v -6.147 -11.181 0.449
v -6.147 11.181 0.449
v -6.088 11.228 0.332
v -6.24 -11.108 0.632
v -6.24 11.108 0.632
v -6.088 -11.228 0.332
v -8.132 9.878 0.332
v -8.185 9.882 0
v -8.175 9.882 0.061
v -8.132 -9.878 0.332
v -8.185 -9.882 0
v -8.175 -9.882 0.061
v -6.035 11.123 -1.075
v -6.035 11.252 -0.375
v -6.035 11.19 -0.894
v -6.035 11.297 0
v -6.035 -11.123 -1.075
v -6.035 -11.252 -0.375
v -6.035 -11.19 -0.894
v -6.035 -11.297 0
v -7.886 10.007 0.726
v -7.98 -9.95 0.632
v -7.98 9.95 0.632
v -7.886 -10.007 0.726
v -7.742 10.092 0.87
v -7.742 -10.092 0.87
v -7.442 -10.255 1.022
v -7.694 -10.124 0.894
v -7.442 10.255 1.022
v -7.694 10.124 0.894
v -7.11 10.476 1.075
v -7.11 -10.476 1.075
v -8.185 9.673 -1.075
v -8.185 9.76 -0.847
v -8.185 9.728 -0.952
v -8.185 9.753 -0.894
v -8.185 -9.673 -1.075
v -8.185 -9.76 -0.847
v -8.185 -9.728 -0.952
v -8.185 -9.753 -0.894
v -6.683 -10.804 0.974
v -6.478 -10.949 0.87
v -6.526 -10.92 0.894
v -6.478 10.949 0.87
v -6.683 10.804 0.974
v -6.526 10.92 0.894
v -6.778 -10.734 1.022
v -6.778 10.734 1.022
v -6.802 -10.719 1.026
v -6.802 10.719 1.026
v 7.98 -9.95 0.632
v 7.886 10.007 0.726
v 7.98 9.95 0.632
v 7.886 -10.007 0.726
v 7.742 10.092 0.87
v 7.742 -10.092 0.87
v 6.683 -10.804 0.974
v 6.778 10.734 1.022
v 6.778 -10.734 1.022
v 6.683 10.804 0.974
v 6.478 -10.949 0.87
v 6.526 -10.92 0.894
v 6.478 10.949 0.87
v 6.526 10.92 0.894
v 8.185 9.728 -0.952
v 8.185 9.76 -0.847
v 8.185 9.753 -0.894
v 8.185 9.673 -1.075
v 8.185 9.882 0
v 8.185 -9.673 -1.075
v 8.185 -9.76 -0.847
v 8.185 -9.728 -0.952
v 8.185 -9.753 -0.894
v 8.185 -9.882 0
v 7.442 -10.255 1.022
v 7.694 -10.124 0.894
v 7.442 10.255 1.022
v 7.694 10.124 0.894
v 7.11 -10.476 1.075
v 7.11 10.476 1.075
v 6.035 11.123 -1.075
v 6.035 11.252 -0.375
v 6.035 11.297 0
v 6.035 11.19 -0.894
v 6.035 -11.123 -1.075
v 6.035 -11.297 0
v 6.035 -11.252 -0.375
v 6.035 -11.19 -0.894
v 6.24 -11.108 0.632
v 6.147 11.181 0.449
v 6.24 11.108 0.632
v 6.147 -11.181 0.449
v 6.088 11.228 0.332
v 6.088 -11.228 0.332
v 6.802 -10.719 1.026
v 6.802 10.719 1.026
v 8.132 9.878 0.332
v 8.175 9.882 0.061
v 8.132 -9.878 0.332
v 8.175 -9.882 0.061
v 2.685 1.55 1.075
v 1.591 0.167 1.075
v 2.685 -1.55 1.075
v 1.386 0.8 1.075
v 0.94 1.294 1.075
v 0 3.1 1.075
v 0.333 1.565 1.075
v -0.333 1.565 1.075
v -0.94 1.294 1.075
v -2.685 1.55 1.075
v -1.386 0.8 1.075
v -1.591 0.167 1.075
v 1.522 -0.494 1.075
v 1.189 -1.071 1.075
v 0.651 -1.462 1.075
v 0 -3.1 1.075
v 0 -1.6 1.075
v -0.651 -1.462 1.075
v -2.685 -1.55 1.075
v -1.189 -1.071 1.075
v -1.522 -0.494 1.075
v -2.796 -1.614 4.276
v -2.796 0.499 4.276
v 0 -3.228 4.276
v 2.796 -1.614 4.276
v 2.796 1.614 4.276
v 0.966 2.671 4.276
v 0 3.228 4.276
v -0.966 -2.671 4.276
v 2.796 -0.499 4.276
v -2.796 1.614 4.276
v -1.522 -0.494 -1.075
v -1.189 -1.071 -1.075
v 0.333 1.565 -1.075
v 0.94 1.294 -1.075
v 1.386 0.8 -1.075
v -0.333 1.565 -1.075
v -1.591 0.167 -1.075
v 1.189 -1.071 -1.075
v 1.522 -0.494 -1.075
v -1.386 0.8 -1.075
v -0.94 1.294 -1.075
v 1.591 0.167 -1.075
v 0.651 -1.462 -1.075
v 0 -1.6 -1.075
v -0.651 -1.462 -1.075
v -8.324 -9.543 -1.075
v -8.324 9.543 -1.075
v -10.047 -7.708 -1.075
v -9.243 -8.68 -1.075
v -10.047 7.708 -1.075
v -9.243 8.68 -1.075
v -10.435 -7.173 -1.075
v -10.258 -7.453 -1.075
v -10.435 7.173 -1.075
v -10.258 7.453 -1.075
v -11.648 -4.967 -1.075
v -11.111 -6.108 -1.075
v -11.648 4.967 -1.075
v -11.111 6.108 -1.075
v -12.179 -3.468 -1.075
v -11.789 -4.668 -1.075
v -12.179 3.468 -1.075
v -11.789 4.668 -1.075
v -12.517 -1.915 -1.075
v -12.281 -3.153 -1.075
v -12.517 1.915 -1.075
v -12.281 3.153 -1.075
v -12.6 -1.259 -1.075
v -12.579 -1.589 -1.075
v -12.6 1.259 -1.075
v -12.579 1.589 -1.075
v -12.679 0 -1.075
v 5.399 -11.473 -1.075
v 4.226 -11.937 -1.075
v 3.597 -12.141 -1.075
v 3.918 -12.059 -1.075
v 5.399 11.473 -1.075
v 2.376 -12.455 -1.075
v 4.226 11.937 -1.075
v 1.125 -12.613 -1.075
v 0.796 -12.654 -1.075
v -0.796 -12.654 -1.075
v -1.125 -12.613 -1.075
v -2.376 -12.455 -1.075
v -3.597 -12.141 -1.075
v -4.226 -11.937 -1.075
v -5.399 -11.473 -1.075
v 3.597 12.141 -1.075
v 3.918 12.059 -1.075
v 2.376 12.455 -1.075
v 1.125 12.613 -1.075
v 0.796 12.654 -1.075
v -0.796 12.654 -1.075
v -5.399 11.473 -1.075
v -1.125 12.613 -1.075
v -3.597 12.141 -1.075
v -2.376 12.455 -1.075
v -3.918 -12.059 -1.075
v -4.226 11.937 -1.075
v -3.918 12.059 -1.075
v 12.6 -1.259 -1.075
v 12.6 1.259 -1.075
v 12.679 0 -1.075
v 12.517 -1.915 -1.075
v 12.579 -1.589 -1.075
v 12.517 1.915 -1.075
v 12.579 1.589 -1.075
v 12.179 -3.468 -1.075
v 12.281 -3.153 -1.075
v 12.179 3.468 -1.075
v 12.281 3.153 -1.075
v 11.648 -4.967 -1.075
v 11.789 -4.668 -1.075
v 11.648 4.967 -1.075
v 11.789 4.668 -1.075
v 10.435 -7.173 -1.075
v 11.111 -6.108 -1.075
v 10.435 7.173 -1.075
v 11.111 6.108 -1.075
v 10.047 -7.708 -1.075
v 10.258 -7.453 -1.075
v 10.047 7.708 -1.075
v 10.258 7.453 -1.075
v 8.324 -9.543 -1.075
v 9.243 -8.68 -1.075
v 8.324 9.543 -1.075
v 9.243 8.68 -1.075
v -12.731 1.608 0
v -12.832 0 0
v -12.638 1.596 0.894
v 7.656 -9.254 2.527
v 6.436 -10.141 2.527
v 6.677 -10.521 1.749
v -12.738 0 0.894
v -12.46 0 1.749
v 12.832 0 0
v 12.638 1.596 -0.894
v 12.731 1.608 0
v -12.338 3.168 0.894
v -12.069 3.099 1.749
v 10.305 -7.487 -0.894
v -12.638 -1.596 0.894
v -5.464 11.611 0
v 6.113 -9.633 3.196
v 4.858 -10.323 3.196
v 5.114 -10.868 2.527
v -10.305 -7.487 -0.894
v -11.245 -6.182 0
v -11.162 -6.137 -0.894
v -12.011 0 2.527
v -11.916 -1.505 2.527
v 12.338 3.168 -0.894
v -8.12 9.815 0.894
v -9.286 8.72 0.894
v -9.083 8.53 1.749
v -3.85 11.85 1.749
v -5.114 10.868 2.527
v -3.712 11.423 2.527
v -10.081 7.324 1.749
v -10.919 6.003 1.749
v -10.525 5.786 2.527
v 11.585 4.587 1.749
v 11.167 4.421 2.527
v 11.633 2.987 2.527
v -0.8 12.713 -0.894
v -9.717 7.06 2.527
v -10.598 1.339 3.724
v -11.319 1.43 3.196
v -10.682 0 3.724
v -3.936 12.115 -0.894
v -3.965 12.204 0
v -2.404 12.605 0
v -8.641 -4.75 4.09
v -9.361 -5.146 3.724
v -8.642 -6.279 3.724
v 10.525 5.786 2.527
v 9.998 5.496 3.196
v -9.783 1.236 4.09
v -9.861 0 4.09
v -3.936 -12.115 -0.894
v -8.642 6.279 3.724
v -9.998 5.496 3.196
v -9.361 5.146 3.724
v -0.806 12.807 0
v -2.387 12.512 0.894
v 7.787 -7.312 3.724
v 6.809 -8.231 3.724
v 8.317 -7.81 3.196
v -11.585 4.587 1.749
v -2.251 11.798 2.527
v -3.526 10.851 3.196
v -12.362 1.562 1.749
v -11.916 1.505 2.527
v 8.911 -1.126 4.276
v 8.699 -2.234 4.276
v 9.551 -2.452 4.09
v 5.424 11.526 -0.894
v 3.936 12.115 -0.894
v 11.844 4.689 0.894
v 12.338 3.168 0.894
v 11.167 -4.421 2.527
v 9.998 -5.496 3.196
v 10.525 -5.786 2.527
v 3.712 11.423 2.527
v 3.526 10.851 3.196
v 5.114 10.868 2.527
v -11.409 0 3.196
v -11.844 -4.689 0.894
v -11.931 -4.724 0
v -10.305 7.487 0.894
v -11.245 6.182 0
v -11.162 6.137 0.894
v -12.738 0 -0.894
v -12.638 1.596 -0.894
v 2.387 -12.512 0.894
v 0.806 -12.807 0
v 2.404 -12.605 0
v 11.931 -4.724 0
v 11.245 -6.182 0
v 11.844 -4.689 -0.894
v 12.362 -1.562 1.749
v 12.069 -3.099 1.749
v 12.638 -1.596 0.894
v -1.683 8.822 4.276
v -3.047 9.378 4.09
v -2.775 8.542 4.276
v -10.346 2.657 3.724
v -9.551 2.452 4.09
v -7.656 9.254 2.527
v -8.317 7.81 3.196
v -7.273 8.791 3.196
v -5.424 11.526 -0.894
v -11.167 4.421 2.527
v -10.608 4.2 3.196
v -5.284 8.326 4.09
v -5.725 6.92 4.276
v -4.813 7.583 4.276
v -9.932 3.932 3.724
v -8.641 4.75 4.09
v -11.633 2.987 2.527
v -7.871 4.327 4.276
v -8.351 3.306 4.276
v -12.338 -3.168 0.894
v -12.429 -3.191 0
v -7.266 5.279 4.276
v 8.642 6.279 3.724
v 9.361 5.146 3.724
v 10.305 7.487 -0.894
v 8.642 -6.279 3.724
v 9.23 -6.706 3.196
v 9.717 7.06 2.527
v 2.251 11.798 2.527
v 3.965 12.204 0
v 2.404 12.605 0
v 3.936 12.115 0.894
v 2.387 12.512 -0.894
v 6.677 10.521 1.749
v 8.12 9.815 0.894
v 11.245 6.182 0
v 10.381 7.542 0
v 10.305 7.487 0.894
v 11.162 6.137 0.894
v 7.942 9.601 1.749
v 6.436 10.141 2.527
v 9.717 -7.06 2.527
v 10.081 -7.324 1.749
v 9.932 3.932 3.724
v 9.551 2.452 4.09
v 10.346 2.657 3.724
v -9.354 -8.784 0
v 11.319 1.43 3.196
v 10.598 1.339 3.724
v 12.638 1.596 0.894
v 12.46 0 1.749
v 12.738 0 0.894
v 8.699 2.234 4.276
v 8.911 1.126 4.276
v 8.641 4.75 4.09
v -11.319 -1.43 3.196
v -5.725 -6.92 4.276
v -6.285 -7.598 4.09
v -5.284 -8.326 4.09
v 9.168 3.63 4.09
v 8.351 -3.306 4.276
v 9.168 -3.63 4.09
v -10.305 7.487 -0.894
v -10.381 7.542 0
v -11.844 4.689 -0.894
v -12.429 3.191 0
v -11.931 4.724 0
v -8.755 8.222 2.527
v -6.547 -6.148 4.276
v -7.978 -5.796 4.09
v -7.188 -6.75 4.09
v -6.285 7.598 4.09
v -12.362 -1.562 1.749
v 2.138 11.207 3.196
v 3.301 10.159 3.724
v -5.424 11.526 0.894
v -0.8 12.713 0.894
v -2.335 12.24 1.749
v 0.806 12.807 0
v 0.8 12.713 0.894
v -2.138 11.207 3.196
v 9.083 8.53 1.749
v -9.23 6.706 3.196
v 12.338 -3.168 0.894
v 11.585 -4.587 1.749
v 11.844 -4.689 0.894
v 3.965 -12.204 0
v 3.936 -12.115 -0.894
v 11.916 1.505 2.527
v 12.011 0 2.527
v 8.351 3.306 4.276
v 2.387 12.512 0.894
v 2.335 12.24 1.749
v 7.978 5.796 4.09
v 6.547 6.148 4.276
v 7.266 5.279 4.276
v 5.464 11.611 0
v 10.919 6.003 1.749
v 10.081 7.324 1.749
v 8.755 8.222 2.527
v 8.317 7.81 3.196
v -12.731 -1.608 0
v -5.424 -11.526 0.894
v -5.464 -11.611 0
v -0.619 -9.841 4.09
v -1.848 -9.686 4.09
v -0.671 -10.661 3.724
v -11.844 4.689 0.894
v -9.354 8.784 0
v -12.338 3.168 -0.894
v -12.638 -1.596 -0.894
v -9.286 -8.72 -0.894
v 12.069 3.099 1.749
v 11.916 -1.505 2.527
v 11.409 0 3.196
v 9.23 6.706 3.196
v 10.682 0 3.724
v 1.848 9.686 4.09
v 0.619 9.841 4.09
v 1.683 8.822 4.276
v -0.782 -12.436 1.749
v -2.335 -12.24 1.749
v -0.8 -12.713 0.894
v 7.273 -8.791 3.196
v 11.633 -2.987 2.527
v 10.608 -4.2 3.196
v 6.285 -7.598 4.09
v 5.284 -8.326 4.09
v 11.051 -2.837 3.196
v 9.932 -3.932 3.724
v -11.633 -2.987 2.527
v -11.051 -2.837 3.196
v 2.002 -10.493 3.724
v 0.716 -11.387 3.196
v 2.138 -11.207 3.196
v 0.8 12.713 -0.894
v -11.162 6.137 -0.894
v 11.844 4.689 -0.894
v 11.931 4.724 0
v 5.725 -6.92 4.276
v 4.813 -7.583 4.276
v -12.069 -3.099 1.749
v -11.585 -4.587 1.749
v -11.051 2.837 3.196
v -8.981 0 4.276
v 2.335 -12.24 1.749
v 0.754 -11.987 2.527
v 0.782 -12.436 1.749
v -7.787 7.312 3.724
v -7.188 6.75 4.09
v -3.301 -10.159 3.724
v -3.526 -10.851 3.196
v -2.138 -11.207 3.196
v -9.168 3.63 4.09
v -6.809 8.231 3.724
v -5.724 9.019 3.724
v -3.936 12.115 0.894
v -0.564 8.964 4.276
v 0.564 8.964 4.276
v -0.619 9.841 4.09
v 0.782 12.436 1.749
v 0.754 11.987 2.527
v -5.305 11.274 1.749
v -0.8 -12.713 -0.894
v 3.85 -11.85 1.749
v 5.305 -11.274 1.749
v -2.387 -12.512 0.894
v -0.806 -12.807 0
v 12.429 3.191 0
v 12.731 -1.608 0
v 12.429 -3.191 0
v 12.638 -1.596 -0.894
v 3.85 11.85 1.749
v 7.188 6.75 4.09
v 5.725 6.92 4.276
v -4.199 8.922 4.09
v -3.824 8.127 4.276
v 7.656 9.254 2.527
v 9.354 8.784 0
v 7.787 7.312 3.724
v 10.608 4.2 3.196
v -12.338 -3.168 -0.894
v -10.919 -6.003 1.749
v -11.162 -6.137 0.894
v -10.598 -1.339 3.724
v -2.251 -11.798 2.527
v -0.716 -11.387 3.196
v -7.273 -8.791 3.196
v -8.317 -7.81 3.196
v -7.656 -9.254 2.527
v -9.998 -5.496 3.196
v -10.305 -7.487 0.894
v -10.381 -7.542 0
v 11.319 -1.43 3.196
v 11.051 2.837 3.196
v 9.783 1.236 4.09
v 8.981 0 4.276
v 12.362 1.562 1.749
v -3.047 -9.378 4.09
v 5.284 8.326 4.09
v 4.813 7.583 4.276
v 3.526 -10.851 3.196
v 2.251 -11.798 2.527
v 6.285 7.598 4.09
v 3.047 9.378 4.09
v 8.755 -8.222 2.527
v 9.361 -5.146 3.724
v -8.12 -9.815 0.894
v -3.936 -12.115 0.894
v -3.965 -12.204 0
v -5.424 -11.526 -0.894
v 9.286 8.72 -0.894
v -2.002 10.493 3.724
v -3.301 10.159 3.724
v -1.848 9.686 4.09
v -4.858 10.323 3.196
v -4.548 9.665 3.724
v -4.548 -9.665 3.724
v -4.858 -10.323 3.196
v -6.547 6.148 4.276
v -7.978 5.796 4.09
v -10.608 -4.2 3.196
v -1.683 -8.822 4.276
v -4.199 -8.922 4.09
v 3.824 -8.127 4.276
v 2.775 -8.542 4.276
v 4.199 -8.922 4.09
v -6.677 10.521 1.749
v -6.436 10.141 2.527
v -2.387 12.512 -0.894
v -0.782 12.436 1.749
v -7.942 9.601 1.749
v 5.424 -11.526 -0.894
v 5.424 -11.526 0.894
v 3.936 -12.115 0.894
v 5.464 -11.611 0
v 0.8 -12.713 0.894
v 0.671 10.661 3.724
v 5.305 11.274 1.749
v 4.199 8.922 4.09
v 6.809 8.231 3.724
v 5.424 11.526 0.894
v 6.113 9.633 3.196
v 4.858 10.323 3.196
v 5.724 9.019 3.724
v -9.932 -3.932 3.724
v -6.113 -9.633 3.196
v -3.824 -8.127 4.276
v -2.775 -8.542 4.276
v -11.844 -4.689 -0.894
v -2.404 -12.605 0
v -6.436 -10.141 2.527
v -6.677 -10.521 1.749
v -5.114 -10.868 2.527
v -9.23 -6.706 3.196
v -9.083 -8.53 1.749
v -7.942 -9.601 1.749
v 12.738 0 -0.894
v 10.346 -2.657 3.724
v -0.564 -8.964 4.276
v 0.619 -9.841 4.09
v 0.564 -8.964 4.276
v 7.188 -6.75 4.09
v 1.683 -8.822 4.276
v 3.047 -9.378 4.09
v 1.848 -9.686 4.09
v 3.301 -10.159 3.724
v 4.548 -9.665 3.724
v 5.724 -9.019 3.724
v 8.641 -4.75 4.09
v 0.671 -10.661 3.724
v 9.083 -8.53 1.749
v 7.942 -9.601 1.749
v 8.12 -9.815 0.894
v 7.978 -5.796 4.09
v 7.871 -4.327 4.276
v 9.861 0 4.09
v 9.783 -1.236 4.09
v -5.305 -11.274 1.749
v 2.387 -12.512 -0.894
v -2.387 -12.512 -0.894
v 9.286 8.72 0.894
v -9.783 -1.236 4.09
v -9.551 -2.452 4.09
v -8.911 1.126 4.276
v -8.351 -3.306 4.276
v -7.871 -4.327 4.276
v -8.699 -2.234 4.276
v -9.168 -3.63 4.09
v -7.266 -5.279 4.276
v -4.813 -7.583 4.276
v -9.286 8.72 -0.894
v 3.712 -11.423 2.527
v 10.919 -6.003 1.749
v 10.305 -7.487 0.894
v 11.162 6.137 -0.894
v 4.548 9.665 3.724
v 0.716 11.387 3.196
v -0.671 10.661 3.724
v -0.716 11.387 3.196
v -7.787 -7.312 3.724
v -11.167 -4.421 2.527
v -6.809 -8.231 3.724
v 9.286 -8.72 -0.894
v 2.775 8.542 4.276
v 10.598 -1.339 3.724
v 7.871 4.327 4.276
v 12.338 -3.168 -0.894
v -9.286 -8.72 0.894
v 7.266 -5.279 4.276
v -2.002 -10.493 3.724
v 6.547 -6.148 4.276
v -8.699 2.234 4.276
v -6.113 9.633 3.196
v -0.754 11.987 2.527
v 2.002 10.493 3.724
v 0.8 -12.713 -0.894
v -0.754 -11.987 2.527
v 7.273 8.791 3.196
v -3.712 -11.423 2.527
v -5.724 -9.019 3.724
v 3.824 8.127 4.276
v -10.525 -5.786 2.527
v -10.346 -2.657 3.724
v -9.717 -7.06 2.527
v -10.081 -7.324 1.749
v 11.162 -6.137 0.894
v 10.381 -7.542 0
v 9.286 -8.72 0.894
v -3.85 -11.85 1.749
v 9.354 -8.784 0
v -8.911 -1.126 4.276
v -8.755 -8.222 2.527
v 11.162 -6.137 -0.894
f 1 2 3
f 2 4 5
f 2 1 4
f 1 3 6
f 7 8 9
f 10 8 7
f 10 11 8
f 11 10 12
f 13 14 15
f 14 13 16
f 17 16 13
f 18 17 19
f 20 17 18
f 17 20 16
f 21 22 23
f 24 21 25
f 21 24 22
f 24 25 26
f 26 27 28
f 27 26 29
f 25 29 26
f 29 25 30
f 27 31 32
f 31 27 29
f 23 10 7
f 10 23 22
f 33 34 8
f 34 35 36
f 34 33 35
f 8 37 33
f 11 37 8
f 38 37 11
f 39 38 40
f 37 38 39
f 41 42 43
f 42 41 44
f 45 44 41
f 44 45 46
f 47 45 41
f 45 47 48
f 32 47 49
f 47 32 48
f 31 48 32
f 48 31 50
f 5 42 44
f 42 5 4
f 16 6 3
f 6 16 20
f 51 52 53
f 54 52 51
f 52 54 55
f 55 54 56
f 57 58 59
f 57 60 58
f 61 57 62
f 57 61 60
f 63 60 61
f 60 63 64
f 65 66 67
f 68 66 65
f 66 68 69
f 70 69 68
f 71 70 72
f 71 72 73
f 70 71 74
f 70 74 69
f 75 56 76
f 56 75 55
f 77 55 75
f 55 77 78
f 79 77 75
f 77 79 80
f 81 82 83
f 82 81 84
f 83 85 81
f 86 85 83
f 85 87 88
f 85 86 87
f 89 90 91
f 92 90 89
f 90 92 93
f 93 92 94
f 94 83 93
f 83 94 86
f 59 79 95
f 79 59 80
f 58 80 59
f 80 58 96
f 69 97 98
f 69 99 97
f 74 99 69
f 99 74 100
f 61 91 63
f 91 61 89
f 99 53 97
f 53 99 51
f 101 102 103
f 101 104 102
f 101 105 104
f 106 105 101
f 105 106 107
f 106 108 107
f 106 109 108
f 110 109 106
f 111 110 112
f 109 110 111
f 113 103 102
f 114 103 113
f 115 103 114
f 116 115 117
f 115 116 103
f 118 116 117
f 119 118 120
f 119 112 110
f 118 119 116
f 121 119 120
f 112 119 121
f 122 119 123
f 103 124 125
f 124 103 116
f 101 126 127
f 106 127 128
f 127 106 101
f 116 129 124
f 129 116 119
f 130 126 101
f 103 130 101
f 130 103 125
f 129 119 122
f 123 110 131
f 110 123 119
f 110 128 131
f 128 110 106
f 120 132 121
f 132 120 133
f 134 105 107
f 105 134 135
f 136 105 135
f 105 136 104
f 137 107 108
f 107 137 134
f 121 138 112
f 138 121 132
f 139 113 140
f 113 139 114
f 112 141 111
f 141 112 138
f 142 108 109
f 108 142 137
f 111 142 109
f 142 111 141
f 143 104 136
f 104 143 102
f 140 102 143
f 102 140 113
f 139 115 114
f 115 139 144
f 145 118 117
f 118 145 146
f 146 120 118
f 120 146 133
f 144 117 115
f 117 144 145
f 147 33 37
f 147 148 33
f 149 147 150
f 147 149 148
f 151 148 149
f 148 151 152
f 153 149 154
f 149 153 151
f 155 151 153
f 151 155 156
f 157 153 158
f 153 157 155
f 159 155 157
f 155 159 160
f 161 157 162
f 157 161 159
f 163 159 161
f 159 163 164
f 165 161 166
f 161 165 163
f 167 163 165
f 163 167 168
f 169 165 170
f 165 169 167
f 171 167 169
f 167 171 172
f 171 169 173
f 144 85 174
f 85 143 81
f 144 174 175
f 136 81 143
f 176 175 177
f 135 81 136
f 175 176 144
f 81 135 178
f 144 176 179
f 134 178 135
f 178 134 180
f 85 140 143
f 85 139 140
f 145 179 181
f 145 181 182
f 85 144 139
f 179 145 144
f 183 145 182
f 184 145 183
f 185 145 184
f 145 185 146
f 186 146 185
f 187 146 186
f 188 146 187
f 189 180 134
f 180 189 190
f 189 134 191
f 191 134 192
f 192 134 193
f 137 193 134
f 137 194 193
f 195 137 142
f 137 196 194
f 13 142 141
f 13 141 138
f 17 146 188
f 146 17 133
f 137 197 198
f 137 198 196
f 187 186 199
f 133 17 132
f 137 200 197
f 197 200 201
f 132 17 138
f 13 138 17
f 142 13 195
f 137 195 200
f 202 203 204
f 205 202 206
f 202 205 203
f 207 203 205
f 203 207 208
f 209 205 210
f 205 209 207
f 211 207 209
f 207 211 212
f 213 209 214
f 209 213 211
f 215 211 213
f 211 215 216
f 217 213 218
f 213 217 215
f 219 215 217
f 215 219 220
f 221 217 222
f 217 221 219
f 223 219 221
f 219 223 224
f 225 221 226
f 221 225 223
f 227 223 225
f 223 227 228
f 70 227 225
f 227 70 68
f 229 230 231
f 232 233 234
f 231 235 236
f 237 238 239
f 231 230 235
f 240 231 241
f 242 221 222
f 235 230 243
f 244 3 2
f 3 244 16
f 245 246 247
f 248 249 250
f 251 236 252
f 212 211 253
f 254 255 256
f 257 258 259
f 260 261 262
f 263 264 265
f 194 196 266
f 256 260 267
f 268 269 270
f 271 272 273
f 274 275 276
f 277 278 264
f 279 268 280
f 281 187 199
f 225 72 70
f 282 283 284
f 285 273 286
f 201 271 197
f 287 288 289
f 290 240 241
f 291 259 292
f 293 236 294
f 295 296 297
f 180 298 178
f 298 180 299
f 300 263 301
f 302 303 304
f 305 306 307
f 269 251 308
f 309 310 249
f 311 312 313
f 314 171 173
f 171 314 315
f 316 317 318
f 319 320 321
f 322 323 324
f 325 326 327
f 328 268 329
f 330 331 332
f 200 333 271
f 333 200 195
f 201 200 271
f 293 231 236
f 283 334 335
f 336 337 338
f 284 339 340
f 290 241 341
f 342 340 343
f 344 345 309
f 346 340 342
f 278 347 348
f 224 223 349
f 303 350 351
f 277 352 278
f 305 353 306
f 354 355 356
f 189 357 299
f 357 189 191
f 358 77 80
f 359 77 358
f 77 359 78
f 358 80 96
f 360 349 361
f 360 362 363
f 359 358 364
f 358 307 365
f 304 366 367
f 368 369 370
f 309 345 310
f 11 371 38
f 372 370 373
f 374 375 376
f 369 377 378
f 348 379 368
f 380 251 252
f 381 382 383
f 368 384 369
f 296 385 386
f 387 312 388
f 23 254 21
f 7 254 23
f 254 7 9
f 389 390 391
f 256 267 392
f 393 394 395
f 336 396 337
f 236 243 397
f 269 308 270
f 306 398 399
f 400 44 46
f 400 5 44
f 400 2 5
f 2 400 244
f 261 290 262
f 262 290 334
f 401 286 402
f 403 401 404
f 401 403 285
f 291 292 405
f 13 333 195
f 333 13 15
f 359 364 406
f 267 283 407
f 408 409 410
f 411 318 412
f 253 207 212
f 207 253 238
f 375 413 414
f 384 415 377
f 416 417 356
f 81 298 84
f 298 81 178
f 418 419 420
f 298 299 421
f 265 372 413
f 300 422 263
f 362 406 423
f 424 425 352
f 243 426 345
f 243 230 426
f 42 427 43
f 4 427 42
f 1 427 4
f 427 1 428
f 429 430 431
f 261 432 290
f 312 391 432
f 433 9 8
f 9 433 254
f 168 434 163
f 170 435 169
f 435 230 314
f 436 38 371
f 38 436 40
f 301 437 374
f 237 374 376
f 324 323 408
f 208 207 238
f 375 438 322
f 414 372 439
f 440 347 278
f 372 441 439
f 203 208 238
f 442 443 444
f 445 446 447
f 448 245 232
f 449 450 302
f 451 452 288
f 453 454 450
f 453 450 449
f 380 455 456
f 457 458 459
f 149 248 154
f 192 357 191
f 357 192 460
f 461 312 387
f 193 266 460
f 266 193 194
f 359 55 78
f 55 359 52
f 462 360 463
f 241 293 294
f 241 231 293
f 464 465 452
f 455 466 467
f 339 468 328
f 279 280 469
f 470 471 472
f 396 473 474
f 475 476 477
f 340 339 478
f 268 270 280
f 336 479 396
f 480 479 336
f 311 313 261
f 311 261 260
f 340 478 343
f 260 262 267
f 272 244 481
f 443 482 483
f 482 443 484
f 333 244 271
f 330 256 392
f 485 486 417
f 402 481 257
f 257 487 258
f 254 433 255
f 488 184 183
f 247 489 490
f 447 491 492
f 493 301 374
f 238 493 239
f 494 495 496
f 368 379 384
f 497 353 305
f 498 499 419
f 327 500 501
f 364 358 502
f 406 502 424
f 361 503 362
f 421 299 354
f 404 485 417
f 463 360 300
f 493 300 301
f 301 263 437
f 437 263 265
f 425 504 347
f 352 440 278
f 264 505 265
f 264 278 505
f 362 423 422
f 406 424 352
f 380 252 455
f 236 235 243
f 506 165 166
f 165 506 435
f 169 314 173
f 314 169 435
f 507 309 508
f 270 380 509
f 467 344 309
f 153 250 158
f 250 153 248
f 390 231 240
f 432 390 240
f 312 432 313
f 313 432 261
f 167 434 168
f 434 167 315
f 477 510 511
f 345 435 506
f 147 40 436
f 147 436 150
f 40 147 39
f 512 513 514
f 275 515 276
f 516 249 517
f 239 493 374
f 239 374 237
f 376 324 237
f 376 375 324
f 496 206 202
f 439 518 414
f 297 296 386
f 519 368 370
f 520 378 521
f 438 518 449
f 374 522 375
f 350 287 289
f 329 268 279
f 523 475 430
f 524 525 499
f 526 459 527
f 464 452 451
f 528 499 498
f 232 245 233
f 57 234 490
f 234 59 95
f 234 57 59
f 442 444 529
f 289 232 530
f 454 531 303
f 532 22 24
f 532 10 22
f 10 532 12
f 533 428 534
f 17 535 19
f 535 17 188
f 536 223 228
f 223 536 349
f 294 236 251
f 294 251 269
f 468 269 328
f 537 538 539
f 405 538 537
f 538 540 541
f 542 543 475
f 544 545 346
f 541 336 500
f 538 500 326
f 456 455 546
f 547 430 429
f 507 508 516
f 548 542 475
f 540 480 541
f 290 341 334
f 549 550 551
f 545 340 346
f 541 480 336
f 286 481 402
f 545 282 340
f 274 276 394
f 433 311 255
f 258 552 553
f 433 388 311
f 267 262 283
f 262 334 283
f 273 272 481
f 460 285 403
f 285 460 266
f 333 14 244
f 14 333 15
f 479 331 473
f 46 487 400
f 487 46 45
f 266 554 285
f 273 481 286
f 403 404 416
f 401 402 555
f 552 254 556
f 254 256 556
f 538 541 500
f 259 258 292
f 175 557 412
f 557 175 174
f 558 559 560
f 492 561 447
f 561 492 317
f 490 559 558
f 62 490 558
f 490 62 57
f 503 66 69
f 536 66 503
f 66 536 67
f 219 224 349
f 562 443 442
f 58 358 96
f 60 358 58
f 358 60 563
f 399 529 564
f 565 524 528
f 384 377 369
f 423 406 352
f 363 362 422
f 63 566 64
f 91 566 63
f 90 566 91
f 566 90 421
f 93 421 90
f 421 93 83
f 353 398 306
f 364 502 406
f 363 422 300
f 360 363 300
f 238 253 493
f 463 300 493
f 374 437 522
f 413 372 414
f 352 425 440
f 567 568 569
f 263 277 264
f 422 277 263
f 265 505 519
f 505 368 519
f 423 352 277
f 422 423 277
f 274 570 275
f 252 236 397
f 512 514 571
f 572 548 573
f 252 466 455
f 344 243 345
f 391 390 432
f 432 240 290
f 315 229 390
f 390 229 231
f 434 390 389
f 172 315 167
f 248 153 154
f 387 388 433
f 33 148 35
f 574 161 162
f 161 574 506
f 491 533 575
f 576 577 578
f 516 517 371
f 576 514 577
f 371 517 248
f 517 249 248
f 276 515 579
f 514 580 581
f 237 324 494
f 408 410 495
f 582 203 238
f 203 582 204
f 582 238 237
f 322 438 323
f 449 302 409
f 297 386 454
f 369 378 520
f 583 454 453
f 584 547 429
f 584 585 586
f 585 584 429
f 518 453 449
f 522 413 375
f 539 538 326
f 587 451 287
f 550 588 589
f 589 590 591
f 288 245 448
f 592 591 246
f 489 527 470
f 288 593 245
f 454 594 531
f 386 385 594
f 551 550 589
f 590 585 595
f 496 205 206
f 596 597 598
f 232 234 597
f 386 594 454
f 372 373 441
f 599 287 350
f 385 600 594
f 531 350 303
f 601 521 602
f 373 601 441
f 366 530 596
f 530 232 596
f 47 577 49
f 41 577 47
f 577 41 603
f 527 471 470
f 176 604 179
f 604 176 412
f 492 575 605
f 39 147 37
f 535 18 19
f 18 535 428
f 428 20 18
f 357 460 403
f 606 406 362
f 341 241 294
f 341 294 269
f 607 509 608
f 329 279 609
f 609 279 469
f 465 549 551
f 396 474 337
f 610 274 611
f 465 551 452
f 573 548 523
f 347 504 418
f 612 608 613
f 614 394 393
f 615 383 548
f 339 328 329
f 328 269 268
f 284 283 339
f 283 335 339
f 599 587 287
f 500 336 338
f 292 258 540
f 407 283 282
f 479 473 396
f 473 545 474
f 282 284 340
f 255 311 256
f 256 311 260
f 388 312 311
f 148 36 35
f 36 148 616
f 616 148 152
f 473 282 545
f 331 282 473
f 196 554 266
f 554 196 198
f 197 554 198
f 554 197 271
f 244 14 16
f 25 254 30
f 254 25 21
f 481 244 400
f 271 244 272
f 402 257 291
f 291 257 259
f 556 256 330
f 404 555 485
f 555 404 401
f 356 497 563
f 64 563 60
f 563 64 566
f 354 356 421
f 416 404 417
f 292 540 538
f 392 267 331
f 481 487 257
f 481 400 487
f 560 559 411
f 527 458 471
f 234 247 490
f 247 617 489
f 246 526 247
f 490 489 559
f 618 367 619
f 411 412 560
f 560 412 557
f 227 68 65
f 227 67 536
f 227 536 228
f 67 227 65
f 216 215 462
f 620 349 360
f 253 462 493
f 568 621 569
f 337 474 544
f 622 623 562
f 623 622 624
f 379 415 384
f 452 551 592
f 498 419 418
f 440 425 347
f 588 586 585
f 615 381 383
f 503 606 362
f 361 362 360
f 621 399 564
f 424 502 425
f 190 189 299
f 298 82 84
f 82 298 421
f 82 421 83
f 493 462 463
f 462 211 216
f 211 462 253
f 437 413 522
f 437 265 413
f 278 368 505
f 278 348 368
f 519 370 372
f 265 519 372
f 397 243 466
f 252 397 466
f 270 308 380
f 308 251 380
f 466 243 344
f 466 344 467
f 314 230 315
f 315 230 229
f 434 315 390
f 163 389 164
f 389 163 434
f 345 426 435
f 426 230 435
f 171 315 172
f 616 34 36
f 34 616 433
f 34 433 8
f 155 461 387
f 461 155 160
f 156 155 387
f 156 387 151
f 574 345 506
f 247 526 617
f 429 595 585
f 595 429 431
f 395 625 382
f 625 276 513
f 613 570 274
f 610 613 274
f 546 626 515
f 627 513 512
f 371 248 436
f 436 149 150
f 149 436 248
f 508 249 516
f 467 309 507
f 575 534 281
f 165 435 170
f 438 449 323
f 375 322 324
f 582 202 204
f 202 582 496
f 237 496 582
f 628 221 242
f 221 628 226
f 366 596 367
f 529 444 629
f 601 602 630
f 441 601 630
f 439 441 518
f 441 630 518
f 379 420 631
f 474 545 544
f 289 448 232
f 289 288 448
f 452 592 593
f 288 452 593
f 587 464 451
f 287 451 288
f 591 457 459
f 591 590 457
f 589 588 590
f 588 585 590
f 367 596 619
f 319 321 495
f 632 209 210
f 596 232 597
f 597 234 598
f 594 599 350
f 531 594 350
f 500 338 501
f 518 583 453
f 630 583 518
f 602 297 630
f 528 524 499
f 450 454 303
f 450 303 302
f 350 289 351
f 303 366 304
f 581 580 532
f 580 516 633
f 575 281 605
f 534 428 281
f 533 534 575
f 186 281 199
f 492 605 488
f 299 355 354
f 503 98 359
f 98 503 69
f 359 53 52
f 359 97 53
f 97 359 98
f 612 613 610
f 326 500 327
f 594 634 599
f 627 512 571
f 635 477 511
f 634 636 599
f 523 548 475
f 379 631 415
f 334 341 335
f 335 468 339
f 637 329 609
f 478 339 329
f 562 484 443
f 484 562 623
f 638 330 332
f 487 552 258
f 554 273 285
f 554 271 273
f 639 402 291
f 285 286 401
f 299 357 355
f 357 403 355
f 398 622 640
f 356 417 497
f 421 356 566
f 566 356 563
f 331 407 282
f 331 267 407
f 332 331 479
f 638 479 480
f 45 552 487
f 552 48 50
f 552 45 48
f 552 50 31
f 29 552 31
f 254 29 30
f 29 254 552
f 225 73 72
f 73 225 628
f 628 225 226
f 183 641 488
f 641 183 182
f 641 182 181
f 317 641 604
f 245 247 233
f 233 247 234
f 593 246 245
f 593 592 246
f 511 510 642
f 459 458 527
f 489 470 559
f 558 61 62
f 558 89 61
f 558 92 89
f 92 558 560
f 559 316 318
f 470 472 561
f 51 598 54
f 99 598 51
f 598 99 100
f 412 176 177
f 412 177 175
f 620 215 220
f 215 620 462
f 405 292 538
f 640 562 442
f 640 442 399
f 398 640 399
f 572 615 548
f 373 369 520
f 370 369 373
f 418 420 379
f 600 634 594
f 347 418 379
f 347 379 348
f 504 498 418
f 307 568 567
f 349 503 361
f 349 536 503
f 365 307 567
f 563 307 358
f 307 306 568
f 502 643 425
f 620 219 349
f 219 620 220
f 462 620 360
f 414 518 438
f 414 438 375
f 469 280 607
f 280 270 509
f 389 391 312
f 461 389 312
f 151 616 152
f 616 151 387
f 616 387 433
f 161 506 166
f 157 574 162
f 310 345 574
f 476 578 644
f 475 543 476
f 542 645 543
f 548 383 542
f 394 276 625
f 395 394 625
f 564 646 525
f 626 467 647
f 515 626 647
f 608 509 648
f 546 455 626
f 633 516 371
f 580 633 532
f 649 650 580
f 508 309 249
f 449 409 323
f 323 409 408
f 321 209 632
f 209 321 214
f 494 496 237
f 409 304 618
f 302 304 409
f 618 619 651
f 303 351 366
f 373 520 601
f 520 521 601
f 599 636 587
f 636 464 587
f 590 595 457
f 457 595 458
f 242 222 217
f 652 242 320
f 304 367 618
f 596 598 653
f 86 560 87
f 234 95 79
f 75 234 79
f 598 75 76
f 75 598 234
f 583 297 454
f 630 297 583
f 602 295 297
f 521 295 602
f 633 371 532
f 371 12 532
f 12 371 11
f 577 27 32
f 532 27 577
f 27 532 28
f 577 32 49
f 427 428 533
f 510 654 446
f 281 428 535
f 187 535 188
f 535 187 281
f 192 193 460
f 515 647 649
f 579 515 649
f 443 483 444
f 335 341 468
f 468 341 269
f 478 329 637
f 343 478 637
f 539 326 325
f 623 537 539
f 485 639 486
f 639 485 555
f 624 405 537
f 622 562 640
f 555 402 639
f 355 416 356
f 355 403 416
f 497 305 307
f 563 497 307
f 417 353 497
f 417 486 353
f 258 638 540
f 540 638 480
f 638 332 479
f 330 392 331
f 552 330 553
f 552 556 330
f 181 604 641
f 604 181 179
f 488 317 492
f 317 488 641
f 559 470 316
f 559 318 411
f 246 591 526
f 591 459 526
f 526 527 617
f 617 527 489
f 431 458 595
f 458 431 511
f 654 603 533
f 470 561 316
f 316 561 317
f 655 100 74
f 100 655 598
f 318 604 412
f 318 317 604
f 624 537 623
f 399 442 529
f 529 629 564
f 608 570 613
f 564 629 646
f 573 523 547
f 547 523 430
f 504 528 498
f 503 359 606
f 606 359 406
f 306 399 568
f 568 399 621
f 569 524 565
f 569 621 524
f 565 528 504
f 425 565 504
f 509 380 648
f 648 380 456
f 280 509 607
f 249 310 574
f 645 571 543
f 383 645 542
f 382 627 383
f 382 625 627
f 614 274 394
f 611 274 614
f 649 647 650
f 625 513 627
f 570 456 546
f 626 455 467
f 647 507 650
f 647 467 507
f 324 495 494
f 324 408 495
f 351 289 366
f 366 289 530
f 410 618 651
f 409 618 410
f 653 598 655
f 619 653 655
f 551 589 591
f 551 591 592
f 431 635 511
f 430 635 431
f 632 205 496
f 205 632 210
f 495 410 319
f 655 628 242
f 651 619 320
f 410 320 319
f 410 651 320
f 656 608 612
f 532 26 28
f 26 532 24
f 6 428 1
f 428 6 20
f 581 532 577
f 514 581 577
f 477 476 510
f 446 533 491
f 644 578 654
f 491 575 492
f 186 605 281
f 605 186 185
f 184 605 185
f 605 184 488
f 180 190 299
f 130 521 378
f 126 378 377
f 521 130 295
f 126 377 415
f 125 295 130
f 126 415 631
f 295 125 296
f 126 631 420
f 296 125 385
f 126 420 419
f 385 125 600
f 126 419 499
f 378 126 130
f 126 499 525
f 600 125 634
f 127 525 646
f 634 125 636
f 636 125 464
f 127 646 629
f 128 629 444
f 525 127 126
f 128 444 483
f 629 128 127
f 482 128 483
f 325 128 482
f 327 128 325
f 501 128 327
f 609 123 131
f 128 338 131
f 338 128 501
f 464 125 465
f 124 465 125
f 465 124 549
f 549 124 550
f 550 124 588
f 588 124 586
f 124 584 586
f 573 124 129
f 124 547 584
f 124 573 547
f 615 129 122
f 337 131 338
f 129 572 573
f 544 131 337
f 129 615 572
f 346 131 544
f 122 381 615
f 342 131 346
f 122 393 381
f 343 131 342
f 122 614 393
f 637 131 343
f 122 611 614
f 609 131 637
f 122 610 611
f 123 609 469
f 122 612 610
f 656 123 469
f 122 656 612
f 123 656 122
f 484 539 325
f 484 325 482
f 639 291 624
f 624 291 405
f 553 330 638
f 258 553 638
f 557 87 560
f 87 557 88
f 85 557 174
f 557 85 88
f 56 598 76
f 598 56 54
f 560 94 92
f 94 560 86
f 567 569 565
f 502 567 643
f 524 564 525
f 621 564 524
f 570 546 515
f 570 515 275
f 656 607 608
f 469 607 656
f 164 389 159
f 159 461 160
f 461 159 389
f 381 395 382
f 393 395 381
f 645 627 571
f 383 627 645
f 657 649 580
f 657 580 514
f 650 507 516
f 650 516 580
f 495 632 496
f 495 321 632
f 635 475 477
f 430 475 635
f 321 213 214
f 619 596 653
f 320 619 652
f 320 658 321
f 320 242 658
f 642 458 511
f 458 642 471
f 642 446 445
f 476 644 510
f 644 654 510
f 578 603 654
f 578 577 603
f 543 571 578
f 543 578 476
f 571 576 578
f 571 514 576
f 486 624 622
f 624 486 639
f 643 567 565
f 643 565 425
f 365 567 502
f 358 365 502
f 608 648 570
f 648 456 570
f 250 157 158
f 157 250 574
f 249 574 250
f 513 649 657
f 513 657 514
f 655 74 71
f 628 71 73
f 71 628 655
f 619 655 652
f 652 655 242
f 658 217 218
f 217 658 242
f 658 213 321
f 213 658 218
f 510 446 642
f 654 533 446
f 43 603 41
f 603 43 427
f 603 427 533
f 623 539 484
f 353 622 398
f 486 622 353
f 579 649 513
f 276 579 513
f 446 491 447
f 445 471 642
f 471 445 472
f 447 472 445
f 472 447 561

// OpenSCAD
// file: M3.scad
module M3_spacer() {
    union(){
        cylinder( 5, 3.1, 3.3, false, $fn = 6);
        translate([0, 0, -4.9])cylinder(  10, 1.6, 1.6, true, $fn = 15);
    };
}

/*
difference(){
    cube([9,9,6],true);
    M3_spacer ();
}
*/

//M3_spacer();
// main file
include <M3.scad>

thickness = 2.15;
distance = 14.22;

difference(){
    hull()
        rotate_extrude(convexity = 10, $fn = 50)
            translate([distance * 0.6, 0, 0])
                circle(r = thickness * 2, $fn = 30);
    union(){
        for (i = [-distance* 1.5, -distance/2, distance/2, distance* 1.5])
            translate ([i, 0, 0]) 
                hull(){
                    rotate ([90, 0, 0])
                    cylinder (distance*3, thickness/2, thickness/2, true, $fn = 20);
                    translate([0, 0, -thickness * 2])rotate ([90, 0, 0])
                    cylinder (distance*4, thickness/2, thickness/2, true, $fn = 20);
                }
        translate ([0, 0, -distance - thickness/2]) cylinder (distance * 2, distance*5, distance*5, true);   
        translate([0, 0, thickness/2])rotate ([0, 0, 30])M3_spacer();       
    }
}
